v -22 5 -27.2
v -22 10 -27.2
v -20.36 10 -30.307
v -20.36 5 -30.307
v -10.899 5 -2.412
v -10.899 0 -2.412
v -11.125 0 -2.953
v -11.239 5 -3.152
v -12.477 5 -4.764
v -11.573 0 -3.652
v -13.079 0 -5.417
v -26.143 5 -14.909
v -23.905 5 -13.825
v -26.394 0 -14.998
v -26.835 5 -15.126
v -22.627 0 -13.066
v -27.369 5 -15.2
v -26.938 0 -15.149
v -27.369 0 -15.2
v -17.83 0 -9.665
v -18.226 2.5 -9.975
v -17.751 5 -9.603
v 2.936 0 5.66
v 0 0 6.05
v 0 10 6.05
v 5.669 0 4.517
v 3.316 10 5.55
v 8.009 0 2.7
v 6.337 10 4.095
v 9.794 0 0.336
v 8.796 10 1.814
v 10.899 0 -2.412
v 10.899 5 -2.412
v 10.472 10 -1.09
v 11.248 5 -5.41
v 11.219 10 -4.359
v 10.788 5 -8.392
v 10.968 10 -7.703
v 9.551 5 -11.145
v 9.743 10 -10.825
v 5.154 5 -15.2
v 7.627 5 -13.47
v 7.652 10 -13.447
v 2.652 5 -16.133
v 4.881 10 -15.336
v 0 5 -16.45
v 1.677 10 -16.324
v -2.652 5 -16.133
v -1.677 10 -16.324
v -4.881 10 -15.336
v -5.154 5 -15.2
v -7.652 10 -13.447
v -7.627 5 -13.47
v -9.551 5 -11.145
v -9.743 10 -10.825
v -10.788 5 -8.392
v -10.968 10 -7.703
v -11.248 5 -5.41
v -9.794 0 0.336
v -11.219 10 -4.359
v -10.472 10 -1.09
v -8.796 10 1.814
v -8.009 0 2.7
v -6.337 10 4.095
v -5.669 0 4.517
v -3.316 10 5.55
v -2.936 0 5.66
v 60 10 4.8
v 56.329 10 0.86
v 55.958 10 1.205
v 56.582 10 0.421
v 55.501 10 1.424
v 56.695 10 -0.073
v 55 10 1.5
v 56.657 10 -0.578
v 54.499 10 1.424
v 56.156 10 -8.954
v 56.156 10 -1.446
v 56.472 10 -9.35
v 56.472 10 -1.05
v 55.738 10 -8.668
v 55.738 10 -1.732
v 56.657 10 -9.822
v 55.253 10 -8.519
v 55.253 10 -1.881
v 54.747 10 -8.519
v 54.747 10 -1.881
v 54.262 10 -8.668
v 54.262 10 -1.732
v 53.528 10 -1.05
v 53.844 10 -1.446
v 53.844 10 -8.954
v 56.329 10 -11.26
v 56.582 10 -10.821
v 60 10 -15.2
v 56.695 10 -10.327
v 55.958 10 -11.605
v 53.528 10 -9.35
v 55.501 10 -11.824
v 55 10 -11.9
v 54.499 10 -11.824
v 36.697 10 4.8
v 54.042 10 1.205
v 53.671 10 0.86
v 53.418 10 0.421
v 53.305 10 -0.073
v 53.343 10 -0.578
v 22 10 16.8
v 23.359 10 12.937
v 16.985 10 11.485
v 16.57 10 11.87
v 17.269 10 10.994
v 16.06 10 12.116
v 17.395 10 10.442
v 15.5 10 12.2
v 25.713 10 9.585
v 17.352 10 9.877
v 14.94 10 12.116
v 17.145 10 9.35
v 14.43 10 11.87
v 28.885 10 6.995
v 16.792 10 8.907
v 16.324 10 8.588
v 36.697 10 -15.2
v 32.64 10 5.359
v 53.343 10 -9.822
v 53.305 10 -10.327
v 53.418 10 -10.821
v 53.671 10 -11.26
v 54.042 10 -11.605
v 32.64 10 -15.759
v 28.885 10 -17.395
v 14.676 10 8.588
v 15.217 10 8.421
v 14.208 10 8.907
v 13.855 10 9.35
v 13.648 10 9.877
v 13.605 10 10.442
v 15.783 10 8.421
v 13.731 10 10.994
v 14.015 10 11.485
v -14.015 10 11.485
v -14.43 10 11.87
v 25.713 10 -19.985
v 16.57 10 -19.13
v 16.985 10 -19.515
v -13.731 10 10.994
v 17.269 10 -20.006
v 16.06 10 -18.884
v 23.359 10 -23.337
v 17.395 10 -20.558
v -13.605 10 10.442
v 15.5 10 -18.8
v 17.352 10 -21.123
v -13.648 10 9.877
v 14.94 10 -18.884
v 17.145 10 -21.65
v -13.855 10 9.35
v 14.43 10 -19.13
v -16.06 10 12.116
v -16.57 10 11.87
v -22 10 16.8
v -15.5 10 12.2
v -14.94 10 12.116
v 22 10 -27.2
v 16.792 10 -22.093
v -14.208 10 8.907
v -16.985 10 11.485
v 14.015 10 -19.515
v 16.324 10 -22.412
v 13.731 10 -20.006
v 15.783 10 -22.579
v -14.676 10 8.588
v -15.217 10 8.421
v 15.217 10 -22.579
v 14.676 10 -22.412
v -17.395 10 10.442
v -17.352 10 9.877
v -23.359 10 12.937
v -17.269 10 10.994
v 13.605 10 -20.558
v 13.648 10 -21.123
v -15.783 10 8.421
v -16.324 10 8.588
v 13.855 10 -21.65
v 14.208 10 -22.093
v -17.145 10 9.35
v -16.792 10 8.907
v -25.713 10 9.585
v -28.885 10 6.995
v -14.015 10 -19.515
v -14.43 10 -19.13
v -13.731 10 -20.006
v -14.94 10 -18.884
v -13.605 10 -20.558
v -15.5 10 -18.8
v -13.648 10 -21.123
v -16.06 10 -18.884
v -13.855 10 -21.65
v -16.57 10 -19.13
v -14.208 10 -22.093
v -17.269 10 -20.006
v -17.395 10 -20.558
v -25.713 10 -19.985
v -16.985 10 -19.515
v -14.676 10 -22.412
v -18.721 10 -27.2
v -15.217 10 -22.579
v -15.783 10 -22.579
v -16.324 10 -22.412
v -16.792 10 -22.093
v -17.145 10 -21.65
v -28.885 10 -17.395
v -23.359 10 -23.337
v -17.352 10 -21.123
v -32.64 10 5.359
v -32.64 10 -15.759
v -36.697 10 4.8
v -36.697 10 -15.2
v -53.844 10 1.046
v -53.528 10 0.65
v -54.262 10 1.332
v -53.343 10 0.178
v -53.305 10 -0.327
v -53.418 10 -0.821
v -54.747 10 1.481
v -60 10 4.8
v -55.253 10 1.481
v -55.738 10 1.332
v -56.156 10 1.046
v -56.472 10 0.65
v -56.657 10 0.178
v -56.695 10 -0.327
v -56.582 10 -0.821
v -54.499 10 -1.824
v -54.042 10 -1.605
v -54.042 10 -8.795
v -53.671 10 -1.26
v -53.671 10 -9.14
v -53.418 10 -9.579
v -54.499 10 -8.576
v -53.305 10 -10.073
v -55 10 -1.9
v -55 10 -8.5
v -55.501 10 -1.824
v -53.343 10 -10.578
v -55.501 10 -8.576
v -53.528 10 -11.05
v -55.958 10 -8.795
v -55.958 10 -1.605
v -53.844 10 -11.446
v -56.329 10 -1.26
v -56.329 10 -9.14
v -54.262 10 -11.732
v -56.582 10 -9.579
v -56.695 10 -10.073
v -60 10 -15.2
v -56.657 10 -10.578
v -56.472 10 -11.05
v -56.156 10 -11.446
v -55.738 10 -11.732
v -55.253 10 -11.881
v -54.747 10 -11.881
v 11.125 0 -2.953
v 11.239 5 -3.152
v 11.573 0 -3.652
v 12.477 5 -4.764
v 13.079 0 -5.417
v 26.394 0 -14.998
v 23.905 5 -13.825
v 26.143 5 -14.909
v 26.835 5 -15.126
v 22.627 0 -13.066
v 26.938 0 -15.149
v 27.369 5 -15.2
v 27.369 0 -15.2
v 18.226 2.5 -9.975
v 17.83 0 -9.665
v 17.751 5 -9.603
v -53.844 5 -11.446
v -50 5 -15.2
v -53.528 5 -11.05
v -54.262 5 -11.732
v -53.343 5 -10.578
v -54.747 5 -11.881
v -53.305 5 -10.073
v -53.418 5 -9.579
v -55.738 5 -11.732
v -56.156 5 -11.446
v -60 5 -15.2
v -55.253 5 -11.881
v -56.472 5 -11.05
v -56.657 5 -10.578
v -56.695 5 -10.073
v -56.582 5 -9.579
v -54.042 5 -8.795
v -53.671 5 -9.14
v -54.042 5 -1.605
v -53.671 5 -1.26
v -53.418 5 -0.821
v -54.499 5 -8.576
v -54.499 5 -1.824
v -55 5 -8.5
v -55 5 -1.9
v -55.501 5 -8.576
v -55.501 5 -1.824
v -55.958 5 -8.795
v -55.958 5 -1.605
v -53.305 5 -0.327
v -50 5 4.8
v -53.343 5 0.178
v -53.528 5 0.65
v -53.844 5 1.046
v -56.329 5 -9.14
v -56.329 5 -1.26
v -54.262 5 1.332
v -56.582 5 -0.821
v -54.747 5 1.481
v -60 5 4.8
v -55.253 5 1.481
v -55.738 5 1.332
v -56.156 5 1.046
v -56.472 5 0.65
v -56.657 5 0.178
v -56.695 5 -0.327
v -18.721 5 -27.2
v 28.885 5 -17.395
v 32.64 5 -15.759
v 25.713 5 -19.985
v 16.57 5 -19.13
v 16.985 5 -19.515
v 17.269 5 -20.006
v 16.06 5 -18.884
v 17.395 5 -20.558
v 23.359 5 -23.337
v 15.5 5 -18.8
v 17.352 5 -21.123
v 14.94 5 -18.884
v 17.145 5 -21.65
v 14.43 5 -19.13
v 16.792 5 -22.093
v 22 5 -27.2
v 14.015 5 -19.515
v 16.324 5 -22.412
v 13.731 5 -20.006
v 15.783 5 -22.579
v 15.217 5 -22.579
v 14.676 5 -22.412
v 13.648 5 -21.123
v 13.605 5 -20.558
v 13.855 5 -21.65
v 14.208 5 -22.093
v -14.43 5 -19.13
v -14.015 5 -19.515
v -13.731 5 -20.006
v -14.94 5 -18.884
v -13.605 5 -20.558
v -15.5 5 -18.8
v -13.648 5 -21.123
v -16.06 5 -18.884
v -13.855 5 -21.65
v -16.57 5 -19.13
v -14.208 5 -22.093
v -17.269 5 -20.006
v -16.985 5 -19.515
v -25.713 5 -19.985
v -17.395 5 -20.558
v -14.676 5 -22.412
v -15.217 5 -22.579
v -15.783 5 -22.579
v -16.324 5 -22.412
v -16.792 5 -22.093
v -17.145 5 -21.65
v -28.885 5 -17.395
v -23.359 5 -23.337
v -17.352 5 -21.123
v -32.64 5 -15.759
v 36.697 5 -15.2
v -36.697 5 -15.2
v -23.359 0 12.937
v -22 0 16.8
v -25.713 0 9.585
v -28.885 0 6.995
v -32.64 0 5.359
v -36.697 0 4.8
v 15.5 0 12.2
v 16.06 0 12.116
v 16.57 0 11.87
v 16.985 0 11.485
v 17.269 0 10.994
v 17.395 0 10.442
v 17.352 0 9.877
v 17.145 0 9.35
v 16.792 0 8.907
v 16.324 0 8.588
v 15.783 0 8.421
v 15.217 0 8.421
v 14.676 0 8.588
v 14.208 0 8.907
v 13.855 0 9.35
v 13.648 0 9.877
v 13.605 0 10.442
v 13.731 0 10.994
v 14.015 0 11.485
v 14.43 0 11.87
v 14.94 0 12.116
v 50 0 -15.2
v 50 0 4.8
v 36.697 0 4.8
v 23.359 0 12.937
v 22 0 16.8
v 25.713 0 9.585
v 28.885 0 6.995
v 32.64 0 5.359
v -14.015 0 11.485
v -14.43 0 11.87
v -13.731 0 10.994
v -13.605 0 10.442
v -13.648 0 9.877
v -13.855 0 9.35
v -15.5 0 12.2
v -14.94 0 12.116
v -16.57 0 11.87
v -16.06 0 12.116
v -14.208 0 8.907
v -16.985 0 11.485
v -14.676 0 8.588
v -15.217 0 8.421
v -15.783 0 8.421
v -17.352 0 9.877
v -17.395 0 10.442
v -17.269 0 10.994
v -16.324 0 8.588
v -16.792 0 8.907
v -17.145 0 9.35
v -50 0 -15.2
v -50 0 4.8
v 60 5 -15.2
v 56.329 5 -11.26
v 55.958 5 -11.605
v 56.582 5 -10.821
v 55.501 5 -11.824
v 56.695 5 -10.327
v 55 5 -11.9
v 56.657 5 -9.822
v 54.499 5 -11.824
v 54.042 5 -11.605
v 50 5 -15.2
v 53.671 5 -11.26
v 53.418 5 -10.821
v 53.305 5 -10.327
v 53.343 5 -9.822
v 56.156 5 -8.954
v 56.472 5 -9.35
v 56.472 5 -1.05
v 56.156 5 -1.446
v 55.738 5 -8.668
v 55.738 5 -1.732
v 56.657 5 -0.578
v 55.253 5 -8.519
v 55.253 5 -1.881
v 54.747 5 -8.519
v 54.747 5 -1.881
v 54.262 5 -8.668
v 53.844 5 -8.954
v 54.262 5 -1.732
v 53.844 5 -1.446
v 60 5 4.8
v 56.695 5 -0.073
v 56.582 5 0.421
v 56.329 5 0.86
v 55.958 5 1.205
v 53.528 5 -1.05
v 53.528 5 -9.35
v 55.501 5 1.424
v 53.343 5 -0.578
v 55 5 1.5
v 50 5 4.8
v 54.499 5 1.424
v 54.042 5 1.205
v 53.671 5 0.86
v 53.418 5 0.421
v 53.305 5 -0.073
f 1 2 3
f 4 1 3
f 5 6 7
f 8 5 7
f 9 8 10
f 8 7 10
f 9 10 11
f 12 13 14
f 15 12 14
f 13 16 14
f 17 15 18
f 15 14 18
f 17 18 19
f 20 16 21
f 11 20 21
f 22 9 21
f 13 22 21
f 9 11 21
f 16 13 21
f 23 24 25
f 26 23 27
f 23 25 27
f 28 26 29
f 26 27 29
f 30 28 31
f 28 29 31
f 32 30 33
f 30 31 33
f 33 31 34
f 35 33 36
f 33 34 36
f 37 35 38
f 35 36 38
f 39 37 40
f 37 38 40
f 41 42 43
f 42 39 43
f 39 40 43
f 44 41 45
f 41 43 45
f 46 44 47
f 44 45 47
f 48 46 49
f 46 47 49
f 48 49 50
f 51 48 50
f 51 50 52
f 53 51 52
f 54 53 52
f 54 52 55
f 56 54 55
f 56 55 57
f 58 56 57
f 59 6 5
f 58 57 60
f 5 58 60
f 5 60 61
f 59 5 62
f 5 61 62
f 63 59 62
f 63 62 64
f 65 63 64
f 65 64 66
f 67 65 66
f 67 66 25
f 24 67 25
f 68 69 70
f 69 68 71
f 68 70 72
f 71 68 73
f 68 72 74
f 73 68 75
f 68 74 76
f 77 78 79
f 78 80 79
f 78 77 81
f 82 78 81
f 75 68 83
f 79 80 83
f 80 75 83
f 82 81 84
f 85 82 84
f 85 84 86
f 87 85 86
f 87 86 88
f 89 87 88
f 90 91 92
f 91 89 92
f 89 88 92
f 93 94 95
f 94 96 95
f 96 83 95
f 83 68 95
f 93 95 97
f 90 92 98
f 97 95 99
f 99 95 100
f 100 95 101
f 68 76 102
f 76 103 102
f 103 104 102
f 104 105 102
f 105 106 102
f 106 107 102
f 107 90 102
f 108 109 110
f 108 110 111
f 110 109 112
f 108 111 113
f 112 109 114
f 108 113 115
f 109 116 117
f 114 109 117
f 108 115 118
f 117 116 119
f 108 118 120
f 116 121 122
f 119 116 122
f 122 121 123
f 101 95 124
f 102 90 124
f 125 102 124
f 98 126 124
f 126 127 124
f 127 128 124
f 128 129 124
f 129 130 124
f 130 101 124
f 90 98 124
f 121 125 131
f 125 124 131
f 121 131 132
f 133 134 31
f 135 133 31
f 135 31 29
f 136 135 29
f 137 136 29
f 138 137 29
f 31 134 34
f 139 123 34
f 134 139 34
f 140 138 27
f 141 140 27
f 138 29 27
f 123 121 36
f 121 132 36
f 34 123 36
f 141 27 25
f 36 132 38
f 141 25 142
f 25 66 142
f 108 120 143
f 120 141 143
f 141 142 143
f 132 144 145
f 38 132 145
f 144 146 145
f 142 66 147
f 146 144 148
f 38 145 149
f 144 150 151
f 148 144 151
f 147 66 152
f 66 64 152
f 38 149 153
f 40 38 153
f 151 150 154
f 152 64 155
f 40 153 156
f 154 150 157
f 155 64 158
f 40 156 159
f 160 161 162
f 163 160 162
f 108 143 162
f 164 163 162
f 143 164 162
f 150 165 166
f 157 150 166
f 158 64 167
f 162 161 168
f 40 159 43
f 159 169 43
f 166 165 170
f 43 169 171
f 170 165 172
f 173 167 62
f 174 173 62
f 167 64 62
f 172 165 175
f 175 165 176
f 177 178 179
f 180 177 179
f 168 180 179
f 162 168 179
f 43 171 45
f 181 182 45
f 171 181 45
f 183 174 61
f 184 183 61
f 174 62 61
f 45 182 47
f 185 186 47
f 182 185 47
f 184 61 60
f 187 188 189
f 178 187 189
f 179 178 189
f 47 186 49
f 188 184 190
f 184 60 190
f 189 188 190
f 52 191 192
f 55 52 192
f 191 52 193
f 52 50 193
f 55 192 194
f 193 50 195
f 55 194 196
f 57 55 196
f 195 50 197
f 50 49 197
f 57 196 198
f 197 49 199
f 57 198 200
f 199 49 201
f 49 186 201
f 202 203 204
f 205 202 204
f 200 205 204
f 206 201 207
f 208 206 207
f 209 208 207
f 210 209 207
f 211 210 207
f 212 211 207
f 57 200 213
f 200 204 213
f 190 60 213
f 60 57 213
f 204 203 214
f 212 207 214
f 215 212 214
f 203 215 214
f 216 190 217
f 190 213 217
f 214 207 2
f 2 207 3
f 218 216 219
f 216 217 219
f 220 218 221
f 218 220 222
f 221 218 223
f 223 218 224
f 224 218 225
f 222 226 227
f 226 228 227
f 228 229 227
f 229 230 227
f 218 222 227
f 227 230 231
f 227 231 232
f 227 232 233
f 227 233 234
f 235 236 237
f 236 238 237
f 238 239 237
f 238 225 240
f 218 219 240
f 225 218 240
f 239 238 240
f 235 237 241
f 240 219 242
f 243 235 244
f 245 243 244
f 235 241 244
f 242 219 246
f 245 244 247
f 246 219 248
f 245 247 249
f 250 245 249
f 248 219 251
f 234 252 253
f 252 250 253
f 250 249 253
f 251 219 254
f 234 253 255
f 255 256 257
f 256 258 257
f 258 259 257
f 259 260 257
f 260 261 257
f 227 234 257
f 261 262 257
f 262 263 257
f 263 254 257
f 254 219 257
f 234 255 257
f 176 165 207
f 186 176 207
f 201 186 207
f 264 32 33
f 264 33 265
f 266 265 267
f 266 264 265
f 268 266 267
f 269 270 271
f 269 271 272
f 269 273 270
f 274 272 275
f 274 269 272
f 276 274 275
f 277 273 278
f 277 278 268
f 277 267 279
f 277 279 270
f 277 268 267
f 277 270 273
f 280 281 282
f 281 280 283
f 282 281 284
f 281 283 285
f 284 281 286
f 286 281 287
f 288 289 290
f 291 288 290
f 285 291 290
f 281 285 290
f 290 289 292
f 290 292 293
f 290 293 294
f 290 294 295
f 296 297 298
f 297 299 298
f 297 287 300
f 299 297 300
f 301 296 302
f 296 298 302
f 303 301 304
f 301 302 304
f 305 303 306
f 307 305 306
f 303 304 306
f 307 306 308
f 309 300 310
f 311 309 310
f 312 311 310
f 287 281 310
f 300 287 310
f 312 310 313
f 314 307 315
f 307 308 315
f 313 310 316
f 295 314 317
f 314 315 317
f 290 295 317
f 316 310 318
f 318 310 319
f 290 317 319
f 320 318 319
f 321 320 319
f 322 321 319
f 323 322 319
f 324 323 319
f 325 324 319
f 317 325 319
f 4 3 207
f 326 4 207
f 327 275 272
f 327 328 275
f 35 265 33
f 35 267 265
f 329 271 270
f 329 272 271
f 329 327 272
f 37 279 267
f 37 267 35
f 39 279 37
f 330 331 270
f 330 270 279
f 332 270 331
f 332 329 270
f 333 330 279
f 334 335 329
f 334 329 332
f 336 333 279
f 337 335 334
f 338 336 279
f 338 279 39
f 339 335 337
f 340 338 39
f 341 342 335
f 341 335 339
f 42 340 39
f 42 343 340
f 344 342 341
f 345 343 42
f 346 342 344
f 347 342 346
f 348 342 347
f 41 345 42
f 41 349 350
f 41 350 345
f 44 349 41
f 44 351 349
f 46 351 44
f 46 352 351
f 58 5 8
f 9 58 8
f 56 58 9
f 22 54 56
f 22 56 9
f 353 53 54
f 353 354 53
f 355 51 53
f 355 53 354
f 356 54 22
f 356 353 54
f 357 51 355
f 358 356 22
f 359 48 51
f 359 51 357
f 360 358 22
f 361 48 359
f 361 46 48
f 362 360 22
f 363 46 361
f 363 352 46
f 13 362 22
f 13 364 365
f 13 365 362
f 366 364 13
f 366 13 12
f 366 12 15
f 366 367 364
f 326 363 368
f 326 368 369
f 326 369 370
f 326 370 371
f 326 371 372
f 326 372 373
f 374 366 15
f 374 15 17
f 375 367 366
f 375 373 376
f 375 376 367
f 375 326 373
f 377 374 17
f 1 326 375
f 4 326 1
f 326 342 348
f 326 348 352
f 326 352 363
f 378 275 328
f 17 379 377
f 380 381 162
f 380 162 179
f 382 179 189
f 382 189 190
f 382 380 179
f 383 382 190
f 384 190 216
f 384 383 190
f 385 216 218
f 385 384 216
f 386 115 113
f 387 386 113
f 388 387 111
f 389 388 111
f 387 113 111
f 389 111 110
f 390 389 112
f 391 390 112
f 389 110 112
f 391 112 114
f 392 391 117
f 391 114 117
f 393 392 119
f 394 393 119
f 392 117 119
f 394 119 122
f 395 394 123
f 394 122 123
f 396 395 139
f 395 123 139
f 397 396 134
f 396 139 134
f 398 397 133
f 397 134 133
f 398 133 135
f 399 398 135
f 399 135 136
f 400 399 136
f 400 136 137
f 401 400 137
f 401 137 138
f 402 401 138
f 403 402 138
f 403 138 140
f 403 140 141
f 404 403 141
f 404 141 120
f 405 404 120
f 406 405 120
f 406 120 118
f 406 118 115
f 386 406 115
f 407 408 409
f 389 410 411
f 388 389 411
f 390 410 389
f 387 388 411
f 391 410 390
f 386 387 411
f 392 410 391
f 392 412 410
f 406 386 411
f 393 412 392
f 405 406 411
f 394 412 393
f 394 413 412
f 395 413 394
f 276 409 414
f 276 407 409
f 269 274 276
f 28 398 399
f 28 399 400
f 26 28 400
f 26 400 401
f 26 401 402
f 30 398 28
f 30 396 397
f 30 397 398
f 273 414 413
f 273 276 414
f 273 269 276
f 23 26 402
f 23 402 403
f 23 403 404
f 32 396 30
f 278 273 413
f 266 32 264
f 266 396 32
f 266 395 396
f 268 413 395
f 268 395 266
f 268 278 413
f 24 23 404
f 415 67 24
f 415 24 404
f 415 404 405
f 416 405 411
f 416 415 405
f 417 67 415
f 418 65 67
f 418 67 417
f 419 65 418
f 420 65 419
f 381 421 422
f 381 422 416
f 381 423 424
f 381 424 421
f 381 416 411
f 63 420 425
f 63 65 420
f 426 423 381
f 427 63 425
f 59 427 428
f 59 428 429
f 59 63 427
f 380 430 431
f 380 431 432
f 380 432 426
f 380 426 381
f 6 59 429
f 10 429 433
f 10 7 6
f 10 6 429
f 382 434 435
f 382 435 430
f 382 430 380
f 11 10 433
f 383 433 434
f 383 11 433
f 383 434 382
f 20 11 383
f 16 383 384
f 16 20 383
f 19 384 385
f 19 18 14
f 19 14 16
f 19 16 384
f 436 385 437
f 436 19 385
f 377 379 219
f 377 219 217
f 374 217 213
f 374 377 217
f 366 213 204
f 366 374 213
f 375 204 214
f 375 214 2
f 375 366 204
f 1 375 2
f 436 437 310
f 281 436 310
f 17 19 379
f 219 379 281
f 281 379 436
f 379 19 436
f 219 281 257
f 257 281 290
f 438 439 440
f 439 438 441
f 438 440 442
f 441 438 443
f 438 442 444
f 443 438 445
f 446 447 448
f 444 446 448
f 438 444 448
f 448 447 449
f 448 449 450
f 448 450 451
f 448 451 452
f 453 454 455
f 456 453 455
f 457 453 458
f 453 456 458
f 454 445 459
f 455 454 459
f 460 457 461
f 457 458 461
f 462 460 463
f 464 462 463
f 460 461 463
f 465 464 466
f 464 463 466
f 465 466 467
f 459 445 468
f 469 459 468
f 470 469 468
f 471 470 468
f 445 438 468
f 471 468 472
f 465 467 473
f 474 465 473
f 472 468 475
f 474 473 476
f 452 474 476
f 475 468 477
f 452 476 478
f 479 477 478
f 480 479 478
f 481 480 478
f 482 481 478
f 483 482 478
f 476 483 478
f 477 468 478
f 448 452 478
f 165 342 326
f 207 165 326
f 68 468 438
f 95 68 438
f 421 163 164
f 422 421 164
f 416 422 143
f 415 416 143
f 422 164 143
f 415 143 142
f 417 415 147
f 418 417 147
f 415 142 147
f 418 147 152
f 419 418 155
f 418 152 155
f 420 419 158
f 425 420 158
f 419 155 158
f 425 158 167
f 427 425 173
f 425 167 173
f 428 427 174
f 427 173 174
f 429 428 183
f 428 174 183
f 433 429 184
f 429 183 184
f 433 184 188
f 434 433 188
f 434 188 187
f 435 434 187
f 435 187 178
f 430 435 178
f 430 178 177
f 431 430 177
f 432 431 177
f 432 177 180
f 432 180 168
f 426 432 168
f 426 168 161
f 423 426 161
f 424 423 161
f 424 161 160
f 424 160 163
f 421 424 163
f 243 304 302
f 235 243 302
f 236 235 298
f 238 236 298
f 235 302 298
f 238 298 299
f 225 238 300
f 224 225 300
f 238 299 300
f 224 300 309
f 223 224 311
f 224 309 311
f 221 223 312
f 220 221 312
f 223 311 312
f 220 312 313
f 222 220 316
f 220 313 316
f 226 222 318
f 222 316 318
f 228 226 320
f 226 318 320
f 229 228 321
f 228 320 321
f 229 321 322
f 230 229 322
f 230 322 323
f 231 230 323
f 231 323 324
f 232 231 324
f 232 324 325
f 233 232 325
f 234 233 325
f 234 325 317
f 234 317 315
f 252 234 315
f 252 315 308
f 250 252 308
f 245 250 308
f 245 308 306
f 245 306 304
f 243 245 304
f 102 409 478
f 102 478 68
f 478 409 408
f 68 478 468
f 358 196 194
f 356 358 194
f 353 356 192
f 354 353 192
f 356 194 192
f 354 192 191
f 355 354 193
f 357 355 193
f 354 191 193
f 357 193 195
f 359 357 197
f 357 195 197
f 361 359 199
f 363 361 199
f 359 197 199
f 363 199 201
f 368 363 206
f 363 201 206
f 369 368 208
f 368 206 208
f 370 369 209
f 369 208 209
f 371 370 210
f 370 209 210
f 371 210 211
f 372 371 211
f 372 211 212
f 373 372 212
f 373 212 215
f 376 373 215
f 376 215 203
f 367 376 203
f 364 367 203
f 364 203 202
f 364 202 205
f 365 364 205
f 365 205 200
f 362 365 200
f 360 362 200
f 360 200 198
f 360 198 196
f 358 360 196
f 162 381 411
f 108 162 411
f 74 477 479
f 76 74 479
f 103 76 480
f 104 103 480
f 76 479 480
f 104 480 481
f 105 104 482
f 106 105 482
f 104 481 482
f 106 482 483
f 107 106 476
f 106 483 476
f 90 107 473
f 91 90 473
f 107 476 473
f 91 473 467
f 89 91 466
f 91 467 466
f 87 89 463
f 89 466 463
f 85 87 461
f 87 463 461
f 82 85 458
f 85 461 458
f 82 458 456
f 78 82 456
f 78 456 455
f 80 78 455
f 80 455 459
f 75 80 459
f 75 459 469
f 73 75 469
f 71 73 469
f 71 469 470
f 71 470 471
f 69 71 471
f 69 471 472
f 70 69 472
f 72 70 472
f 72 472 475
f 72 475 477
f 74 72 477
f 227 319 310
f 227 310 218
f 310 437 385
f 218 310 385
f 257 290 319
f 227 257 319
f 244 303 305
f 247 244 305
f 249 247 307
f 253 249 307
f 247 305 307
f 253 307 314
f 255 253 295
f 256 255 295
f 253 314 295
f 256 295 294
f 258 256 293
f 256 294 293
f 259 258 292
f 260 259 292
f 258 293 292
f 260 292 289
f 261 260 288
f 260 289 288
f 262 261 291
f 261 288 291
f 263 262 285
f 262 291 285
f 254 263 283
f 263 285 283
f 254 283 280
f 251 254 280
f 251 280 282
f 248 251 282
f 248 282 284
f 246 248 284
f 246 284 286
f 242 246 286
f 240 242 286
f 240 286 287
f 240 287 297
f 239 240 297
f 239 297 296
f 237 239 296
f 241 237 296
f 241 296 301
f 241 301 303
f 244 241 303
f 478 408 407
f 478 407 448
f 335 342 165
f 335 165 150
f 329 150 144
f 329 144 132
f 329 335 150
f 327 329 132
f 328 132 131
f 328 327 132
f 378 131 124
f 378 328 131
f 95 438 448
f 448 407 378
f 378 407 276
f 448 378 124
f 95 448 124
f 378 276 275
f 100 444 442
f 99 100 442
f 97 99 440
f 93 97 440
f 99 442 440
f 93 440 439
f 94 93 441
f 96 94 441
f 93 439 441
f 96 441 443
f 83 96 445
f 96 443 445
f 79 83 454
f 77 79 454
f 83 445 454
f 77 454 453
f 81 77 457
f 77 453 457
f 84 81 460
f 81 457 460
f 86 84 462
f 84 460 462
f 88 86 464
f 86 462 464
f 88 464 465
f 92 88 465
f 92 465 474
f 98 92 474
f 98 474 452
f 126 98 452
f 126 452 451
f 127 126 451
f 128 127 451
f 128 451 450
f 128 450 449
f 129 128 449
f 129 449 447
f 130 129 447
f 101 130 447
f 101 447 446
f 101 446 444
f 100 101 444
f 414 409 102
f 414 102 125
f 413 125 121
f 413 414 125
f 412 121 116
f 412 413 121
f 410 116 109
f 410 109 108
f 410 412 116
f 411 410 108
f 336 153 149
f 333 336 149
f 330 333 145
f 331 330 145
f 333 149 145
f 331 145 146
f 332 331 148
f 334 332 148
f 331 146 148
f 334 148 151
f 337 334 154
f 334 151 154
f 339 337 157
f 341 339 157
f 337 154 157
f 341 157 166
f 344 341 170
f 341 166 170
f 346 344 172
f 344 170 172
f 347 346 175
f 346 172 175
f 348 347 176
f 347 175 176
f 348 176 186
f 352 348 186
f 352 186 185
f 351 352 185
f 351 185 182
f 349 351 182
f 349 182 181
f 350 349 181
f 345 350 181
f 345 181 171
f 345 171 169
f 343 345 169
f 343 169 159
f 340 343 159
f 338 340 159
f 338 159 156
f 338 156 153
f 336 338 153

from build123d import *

# Parameters (mm, degrees)
AUFSATZ_LINEAR_AUSTRAGEN1_DEPTH      = 10
SKIZZE6_R                            = 1.9
SKIZZE6_R_2                          = 11.25
SCHNITT_LINEAR_AUSTRAGEN4_DEPTH      = 67.632124385
SKIZZE7_W                            = 20.880821379
SKIZZE7_H                            = 5
SCHNITT_LINEAR_AUSTRAGEN5_DEPTH      = 87.970339772
VERRUNDUNG3_R                        = 15
SCHNITT_LINEAR_AUSTRAGEN6_DEPTH      = 69.731361244
SCHNITT_LINEAR_AUSTRAGEN6_DEPTH_BACK = 69.731361244
SKIZZE8_W                            = 10
SKIZZE8_H                            = 5
SKIZZE9_R                            = 1.7
SCHNITT_LINEAR_AUSTRAGEN7_DEPTH      = 10
AUFSATZ_LINEAR_AUSTRAGEN2_DEPTH      = 5


with BuildPart() as part:
    # Skizze1 → Aufsatz-Linear austragen1 (new body)
    with BuildSketch(Plane(origin=(0, 0, 0), x_dir=(1, 0, 0), z_dir=(0, 1, 0))):
        Polygon((-60, -4.8), (-22, -4.8), (-22, -16.8), (22, -16.8), (22, -4.8), (60, -4.8), (60, 15.2), (22, 15.2), (22, 27.2), (0, 27.2), (-22, 27.2), (-22, 15.2), (-60, 15.2), align=None)
    extrude(amount=AUFSATZ_LINEAR_AUSTRAGEN1_DEPTH)

    # Skizze6 → Schnitt-Linear austragen4 (cut, through all)
    with BuildSketch(Plane(origin=(0, 10, 0), x_dir=(1, 0, 0), z_dir=(0, 1, 0))):
        with Locations(Location((15.5, 20.7, 0), (0, 0, 270))):
            Circle(SKIZZE6_R)
        with Locations(Location((15.5, -10.3, 0), (0, 0, 270))):
            Circle(SKIZZE6_R)
        with Locations(Location((-15.5, -10.3, 0), (0, 0, 270))):
            Circle(SKIZZE6_R)
        with Locations(Location((-15.5, 20.7, 0), (0, 0, 270))):
            Circle(SKIZZE6_R)
        with Locations(Location((0, 5.2, 0), (0, 0, 270))):
            Circle(SKIZZE6_R_2)
    extrude(amount=-SCHNITT_LINEAR_AUSTRAGEN4_DEPTH, mode=Mode.SUBTRACT)

    # Skizze7 → Schnitt-Linear austragen5 (cut, through all)
    with BuildSketch(Plane.ZY.offset(22)):
        with Locations((-25.64041069, 2.5)):
            Rectangle(SKIZZE7_W, SKIZZE7_H)
    extrude(amount=-SCHNITT_LINEAR_AUSTRAGEN5_DEPTH, mode=Mode.SUBTRACT)

    # Verrundung3
    # the kernel refuses this fillet: 15 mm, written as the material it adds along each edge
    with BuildSketch(Plane(origin=(-22, 5, -15.2), x_dir=(0, 0, -1), z_dir=(0, 1, 0))) as verrundung3_piece_1:
        with BuildLine():
            CenterArc((15, 14.696938457), VERRUNDUNG3_R, 180, 78.463040967)
            Line((0, 14.696938457), (-0.3, 14.696938457))
            Line((-0.3, 14.696938457), (-0.3, 0))
            Line((-0.3, 0), (0, -0.3))
            ThreePointArc((0, -0.3), (6, -0.3), (11.94, -0.293938769))
            Line((11.94, -0.293938769), (12, 0))
        make_face()
    extrude(amount=5)
    with BuildSketch(Plane(origin=(-22, 0, 4.8), x_dir=(-1, 0, 0), z_dir=(0, 1, 0))) as verrundung3_piece_2:
        with BuildLine():
            CenterArc((14.696938457, 15), VERRUNDUNG3_R, 191.536959033, 78.463040967)
            Line((0, 12), (-0.293938769, 11.94))
            ThreePointArc((-0.293938769, 11.94), (-0.3, 6), (-0.3, 0))
            Line((-0.3, 0), (0, -0.3))
            Line((0, -0.3), (14.696938457, -0.3))
            Line((14.696938457, -0.3), (14.696938457, 0))
        make_face()
    extrude(amount=10)
    with BuildSketch(Plane(origin=(22, 0, 4.8), x_dir=(1, 0, 0), z_dir=(0, 1, 0))) as verrundung3_piece_3:
        with BuildLine():
            CenterArc((14.696938457, -15), VERRUNDUNG3_R, 90, 78.463040967)
            Line((0, -12), (-0.293938769, -11.94))
            ThreePointArc((-0.293938769, -11.94), (-0.3, -6), (-0.3, 0))
            Line((-0.3, 0), (0, 0.3))
            Line((0, 0.3), (14.696938457, 0.3))
            Line((14.696938457, 0.3), (14.696938457, 0))
        make_face()
    extrude(amount=10)
    with BuildSketch(Plane(origin=(22, 5, -15.2), x_dir=(1, 0, 0), z_dir=(0, 1, 0))) as verrundung3_piece_4:
        with BuildLine():
            CenterArc((14.696938457, 15), VERRUNDUNG3_R, 191.536959033, 78.463040967)
            Line((0, 12), (-0.293938769, 11.94))
            ThreePointArc((-0.293938769, 11.94), (-0.3, 6), (-0.3, 0))
            Line((-0.3, 0), (0, -0.3))
            Line((0, -0.3), (14.696938457, -0.3))
            Line((14.696938457, -0.3), (14.696938457, 0))
        make_face()
    extrude(amount=5)

    # Verrundung4
    # a fillet whose section is not a circle: 17 mm, written as the material it takes off along each edge
    with BuildSketch(Plane(origin=(-5.153882032, -55.537810403, -15.2), x_dir=(-0.4098221227148323, 0, 0.912165460721633), z_dir=(0, 1, 0))) as verrundung4_piece_1:
        with BuildLine():
            Bezier((14.018959465, 0), (3.694910003, -8.223980839), (9.10424934, -20.263868965), weights=[1, 0.223796354, 1])
            Line((9.10424934, -20.263868965), (0, 0))
            ThreePointArc((0, 0), (7.009479733, -2.450585595), (14.018959465, 0))
        make_face()
    extrude(amount=60.537810403, mode=Mode.SUBTRACT)
    with BuildSketch(Plane(origin=(5.153882032, -55.537810403, -15.2), x_dir=(0.40982212271483137, 0, 0.9121654607216333), z_dir=(0, 1, 0))) as verrundung4_piece_2:
        with BuildLine():
            Bezier((14.018959465, 0), (3.694910003, 8.223980839), (9.10424934, 20.263868965), weights=[1, 0.223796354, 1])
            Line((9.10424934, 20.263868965), (0, 0))
            ThreePointArc((0, 0), (7.009479733, 2.450585595), (14.018959465, 0))
        make_face()
    extrude(amount=60.537810403, mode=Mode.SUBTRACT)

    # Skizze8 → Schnitt-Linear austragen6 (cut, two sides: drawn at the far end of the back side and taken through both)
    with BuildSketch(Plane(origin=(0, 0, -15.2), x_dir=(-1, 0, 0), z_dir=(0, 0, -1)).offset(-SCHNITT_LINEAR_AUSTRAGEN6_DEPTH_BACK)):
        with Locations((-55, 2.5)):
            Rectangle(SKIZZE8_W, SKIZZE8_H)
        with Locations((55, 2.5)):
            Rectangle(SKIZZE8_W, SKIZZE8_H)
    extrude(amount=SCHNITT_LINEAR_AUSTRAGEN6_DEPTH + SCHNITT_LINEAR_AUSTRAGEN6_DEPTH_BACK, mode=Mode.SUBTRACT)

    # Skizze9 → Schnitt-Linear austragen7 (cut)
    with BuildSketch(Plane.XZ.offset(-5)):
        with Locations(Location((-55, -0.2, 0), (0, 0, 270))):
            Circle(SKIZZE9_R)
        with Locations(Location((-55, -10.2, 0), (0, 0, 90))):
            Circle(SKIZZE9_R)
        with Locations(Location((55, -10.2, 0), (0, 0, 270))):
            Circle(SKIZZE9_R)
        with Locations(Location((55, -0.2, 0), (0, 0, 90))):
            Circle(SKIZZE9_R)
    extrude(amount=-SCHNITT_LINEAR_AUSTRAGEN7_DEPTH, mode=Mode.SUBTRACT)

    # Skizze10 → Aufsatz-Linear austragen2 (add)
    with BuildSketch(Plane(origin=(0, 10, 0), x_dir=(1, 0, 0), z_dir=(0, 1, 0))):
        Polygon((-22, 27.2), (-20.360366379, 30.307150274), (-18.720732758, 27.2), align=None)
    extrude(amount=-AUFSATZ_LINEAR_AUSTRAGEN2_DEPTH)


solid = part.part
